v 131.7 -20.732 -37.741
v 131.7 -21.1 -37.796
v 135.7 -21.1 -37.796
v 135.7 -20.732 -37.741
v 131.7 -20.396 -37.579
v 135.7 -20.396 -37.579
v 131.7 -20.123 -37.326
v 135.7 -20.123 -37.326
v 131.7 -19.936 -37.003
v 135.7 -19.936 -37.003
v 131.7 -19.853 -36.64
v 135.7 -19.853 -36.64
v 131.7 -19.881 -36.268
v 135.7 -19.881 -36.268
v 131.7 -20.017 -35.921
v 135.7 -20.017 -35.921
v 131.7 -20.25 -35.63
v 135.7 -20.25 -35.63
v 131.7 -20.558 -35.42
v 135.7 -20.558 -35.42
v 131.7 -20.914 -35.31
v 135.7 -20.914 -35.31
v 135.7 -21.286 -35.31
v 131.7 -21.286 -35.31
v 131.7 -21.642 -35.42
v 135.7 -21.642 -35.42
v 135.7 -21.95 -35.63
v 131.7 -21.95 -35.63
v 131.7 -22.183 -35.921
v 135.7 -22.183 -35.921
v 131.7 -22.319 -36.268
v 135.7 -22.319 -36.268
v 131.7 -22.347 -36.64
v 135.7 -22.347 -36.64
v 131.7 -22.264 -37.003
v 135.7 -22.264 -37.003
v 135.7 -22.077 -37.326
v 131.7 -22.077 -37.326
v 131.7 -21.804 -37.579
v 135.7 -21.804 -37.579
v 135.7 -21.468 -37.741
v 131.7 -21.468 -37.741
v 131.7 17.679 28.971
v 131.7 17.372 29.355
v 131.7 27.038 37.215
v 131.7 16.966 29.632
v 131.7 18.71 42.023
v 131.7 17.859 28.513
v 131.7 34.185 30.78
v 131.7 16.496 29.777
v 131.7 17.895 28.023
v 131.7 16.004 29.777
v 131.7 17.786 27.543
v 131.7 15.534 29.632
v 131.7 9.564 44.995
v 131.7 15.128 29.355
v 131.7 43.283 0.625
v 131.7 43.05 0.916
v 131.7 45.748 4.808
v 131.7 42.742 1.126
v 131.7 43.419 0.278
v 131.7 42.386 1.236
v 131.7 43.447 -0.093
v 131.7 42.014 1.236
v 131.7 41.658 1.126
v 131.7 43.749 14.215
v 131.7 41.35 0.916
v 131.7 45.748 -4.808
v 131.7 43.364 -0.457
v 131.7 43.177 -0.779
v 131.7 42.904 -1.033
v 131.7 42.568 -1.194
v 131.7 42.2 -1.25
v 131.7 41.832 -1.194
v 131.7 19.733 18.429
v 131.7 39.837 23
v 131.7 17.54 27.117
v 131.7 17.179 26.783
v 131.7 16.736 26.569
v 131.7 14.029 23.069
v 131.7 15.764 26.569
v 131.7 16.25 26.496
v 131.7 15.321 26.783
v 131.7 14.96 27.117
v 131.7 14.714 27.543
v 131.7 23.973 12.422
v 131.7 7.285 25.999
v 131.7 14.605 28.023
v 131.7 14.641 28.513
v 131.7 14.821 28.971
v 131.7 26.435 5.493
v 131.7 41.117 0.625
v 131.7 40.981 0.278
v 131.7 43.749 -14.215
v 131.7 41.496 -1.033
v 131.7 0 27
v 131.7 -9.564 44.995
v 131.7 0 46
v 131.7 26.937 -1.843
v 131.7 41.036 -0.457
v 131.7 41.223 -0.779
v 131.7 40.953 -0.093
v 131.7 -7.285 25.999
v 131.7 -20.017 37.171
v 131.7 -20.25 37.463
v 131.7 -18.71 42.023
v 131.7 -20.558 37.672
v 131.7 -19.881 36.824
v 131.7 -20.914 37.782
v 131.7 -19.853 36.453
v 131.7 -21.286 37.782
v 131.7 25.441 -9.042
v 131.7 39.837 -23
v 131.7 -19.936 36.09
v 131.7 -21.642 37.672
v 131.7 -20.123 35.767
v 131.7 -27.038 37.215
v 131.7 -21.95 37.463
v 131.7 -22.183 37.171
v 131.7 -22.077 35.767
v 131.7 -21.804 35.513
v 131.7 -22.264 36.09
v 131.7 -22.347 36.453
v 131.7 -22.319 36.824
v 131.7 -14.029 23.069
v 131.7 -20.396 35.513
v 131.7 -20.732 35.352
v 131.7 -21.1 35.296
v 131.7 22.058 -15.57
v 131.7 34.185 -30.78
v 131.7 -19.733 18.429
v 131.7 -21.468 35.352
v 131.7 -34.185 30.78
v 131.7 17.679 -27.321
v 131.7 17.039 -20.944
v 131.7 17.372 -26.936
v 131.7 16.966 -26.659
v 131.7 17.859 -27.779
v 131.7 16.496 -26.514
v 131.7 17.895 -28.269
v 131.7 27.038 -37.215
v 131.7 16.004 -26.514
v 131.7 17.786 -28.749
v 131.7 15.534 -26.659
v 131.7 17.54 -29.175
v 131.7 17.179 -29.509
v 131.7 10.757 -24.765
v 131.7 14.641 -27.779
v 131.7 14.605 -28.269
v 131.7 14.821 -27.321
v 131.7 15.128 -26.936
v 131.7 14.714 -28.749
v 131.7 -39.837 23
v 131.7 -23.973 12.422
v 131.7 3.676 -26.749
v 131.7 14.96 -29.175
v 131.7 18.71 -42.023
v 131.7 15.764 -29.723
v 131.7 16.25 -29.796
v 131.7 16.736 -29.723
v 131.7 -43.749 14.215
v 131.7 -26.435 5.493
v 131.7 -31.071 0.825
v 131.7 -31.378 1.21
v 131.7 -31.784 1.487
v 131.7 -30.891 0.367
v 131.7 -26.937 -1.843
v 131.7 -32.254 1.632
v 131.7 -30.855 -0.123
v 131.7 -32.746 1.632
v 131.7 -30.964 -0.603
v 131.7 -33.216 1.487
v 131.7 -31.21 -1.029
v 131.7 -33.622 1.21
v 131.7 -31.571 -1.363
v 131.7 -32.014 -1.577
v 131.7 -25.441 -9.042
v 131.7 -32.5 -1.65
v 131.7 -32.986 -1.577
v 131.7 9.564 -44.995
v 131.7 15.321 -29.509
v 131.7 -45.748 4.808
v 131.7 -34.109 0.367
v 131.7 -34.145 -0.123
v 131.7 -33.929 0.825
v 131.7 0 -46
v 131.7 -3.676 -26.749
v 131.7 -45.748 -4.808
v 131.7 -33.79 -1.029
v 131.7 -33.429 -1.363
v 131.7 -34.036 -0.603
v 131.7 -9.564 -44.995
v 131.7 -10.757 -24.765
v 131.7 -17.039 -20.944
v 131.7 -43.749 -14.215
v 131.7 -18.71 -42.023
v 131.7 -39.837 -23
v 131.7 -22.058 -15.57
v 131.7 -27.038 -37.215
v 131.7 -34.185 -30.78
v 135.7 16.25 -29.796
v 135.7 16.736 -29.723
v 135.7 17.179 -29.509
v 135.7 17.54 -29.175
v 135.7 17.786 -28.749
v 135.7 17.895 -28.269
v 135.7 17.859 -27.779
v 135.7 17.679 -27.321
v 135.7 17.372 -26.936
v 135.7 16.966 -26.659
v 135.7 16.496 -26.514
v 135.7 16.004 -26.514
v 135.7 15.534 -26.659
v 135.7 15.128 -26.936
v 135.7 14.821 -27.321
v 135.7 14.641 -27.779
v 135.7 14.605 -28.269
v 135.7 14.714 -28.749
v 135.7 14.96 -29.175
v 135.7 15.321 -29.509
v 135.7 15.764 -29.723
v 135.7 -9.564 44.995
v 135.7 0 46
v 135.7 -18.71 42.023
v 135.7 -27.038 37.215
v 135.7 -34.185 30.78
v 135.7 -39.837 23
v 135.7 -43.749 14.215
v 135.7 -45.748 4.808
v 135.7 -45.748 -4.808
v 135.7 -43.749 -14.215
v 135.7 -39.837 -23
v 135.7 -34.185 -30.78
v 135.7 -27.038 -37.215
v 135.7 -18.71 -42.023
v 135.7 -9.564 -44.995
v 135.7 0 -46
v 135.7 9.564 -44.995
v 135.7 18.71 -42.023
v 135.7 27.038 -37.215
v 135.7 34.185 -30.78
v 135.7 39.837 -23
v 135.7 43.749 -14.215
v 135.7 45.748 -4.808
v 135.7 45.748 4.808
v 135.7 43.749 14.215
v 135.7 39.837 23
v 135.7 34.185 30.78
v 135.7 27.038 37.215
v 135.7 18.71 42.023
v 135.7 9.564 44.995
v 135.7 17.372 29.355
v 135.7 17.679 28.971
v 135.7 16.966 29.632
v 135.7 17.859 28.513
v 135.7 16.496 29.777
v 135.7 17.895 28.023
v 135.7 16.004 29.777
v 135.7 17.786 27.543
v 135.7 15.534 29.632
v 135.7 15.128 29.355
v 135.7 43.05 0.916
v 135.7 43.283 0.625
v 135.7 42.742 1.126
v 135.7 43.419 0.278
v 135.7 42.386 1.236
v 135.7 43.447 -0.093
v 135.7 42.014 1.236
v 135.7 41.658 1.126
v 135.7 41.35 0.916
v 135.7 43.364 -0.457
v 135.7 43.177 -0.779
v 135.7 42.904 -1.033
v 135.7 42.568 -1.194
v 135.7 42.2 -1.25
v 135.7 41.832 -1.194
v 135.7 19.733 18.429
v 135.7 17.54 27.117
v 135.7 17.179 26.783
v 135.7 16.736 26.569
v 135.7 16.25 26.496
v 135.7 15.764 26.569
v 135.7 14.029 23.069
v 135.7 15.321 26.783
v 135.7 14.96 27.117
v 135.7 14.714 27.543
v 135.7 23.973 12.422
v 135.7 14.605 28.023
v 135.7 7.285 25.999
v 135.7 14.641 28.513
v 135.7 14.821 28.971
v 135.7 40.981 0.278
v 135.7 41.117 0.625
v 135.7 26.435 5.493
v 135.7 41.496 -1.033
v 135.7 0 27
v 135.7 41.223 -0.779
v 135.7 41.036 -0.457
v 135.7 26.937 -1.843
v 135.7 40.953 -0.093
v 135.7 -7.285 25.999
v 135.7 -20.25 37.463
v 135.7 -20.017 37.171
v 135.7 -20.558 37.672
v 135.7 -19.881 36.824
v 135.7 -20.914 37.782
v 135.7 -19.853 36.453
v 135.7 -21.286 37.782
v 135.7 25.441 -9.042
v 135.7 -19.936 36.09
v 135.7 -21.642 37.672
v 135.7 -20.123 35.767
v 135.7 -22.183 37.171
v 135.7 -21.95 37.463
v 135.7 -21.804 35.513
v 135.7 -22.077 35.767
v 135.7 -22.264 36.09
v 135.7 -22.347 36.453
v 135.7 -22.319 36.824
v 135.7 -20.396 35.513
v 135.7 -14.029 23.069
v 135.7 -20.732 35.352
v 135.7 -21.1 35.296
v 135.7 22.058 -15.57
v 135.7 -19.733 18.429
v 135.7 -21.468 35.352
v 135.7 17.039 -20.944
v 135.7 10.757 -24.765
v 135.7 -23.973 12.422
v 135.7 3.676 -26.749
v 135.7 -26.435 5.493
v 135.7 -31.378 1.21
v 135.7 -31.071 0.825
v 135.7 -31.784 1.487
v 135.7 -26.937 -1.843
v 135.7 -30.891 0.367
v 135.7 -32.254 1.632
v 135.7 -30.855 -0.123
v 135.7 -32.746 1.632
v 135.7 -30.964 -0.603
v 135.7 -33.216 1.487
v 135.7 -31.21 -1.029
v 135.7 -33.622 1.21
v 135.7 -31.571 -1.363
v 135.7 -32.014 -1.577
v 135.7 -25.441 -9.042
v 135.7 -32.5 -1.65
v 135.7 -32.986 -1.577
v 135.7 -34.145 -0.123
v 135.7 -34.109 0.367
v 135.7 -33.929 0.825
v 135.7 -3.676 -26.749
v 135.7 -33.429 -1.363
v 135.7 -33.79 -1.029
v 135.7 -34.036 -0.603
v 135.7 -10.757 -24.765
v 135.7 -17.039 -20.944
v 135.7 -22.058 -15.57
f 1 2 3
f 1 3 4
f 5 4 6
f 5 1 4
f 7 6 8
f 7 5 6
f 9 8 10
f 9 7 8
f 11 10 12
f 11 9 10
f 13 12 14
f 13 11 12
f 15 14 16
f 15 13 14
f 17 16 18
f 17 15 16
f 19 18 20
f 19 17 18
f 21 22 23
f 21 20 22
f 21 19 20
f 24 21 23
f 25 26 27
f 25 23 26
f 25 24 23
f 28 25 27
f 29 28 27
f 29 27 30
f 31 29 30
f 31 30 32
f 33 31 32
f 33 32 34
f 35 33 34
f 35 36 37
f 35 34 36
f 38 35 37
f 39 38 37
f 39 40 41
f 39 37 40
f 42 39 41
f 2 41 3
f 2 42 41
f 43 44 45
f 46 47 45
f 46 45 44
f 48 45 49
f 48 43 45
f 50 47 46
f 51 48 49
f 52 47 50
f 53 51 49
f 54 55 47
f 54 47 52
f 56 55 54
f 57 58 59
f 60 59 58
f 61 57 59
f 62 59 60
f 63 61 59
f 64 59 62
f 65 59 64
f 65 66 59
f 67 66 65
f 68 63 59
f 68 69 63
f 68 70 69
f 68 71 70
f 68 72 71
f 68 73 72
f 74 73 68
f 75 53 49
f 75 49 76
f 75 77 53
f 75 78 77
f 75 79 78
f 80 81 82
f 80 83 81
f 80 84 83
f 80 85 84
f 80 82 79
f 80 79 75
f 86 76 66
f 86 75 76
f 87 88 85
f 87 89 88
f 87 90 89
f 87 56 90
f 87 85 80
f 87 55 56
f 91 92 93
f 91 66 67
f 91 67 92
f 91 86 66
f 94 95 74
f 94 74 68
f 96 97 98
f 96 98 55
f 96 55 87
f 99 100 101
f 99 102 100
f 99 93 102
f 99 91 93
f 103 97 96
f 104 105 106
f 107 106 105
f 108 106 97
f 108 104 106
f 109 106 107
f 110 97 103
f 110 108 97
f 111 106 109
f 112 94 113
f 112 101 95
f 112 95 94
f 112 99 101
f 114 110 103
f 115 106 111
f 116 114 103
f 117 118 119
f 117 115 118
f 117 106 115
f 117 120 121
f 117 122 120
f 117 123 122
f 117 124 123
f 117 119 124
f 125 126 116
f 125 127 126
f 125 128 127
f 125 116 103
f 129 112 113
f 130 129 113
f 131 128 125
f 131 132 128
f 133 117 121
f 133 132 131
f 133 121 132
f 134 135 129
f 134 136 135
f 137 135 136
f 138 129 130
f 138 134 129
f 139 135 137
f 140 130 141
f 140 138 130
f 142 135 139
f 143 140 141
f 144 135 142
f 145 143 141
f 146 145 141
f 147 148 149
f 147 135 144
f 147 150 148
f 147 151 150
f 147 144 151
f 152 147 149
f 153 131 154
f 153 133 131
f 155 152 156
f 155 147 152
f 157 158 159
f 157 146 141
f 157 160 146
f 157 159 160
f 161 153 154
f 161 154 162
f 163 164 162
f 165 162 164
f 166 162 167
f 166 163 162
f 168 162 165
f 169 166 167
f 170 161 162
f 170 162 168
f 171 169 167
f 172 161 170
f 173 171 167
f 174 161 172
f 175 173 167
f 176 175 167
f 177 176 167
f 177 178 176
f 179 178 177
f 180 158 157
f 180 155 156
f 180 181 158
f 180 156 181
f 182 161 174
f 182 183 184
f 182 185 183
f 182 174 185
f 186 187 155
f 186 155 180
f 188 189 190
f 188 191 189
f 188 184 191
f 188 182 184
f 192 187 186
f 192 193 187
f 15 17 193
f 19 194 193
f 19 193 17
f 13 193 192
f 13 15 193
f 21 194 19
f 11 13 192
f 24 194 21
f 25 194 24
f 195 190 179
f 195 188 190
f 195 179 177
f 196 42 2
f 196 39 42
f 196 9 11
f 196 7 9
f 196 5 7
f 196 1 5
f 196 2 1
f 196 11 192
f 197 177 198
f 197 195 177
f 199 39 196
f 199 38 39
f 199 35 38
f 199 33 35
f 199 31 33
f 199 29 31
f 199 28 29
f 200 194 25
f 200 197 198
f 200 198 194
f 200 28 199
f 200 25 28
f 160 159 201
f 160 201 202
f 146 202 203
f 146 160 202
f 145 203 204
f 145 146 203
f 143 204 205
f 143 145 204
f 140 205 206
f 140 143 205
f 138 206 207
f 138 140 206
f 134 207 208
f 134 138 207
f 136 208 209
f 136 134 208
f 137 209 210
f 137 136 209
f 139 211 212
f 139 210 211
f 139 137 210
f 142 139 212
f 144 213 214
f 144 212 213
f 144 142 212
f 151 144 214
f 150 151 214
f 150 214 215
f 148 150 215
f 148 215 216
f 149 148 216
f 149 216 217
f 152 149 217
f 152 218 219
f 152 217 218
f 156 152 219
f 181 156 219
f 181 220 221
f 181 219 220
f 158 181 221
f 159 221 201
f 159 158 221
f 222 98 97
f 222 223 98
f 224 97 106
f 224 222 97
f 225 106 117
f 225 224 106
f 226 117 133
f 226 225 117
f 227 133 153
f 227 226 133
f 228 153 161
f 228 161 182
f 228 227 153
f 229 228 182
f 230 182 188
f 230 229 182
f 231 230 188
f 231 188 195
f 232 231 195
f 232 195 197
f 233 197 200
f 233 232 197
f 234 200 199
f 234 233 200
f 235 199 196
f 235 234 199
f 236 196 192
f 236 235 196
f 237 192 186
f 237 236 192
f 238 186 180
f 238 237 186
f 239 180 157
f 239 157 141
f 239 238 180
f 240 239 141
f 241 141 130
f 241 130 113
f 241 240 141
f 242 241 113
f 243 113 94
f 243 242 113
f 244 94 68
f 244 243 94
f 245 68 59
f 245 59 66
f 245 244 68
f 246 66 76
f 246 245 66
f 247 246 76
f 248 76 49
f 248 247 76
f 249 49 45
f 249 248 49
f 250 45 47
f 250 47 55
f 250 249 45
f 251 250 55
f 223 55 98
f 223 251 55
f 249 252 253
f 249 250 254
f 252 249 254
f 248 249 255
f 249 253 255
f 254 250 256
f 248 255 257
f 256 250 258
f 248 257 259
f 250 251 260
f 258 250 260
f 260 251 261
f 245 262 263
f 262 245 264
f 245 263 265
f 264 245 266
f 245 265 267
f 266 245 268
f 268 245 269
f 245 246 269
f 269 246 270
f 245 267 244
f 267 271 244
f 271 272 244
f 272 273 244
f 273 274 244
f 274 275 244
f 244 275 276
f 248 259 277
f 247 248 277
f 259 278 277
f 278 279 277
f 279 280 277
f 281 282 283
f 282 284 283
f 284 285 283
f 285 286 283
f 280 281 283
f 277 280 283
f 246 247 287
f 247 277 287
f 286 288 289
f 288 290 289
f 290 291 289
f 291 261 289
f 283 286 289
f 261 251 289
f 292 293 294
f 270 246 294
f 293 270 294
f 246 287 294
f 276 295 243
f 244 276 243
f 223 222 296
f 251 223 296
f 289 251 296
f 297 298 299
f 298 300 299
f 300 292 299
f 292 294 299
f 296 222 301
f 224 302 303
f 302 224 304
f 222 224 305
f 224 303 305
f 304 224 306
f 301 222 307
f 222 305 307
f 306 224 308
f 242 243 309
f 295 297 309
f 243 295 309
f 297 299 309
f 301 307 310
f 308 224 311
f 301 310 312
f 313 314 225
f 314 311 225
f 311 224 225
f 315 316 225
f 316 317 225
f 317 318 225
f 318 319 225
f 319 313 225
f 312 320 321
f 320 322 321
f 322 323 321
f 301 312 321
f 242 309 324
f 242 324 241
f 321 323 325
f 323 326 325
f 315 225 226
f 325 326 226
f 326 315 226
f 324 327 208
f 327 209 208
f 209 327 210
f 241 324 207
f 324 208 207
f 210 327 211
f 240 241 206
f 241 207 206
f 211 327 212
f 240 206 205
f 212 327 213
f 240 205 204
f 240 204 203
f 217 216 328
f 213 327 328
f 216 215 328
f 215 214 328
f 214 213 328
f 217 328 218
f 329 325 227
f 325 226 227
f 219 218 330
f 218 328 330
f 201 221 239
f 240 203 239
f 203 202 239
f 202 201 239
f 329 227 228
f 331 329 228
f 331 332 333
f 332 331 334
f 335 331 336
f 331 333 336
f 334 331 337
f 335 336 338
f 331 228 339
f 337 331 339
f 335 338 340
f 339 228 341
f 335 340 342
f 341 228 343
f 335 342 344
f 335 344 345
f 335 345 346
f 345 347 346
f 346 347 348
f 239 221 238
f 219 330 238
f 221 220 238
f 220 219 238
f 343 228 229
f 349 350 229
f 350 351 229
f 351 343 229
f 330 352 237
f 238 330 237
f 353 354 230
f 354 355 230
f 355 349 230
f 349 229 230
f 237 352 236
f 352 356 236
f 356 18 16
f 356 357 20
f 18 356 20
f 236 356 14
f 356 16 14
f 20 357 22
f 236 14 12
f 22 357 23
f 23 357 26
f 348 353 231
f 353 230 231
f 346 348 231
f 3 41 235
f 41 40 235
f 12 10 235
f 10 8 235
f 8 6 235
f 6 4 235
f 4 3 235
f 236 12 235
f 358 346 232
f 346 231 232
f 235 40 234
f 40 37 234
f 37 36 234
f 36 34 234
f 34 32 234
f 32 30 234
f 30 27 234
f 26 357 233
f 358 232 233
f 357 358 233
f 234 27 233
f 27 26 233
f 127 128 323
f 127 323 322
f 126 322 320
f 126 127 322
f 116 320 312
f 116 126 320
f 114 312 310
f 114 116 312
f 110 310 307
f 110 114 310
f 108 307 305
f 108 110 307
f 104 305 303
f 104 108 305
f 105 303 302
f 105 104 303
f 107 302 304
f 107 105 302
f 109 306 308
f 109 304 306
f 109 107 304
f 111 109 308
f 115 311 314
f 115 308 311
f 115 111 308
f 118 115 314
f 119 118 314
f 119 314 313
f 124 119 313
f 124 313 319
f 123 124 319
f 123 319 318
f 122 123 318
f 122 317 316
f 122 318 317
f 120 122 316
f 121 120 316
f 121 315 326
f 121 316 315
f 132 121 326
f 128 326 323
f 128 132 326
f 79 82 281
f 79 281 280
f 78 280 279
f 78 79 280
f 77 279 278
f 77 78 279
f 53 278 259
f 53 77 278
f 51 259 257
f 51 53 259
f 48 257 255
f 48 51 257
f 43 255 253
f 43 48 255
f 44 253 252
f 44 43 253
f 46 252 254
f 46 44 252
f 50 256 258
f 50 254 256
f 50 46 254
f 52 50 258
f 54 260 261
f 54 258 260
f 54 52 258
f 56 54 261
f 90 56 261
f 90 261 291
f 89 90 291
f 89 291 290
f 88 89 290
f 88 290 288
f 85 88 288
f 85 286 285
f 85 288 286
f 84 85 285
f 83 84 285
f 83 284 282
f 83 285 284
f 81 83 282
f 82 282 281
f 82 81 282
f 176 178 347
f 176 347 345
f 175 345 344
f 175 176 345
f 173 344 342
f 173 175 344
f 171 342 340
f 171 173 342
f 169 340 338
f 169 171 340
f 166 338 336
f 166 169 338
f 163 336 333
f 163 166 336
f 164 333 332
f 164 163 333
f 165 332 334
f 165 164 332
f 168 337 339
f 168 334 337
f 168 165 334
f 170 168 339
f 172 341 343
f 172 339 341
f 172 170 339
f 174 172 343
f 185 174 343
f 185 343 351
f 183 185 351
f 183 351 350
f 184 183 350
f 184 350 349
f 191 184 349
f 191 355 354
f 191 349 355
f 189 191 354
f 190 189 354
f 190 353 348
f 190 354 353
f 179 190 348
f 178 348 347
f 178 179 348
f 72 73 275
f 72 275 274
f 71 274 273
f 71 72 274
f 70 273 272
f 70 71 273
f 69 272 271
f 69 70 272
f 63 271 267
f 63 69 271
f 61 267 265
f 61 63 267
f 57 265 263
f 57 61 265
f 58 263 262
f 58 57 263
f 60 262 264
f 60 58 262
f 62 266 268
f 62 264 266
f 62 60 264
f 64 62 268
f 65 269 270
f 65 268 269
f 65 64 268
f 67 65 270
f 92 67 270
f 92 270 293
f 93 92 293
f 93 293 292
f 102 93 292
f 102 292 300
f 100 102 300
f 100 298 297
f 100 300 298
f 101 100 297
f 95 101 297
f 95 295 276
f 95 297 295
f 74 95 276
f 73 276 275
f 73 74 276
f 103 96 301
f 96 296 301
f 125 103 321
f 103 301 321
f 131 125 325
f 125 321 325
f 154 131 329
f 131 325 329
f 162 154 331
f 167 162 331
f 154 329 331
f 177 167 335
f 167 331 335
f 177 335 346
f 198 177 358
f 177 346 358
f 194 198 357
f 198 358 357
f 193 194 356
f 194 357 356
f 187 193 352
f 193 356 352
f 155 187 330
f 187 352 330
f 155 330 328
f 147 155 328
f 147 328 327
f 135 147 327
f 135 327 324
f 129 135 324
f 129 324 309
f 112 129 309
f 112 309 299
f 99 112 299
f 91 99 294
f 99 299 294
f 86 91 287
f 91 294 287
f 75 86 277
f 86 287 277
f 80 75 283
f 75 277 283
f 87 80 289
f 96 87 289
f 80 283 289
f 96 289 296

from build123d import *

# Parameters (mm, degrees)
AXIAL_PROFILE_MM_W     = 4
AXIAL_PROFILE_MM_H     = 19
AXIAL_HOLES_DEPTH      = 151.487507787
AXIAL_HOLES_DEPTH_BACK = 151.487507787
SKETCH2_R              = 1.25
SKETCH2_R_2            = 1.65


with BuildPart() as part:
    # Axial profile (mm) → Full revolution (revolve)
    with BuildSketch(Plane.XY, mode=Mode.PRIVATE) as full_revolution_sk:
        with Locations((133.7, 36.5)):
            Rectangle(AXIAL_PROFILE_MM_W, AXIAL_PROFILE_MM_H)
    revolve(full_revolution_sk.sketch.rotate(Axis((-110, 0, 0), (1, 0, 0)), 90), axis=Axis((-110, 0, 0), (1, 0, 0)))

    # Sketch2 → Axial holes (cut, two sides: drawn at the far end of the back side and taken through both)
    with BuildSketch(Plane(origin=(0, 0, 0), x_dir=(0, 0, -1), z_dir=(1, 0, 0)).offset(-AXIAL_HOLES_DEPTH_BACK)):
        with Locations((0, 42.2)):
            Circle(SKETCH2_R)
        with Locations((-36.54627204, -21.1)):
            Circle(SKETCH2_R)
        with Locations((36.54627204, -21.1)):
            Circle(SKETCH2_R)
        with Locations((-28.145825623, 16.25)):
            Circle(SKETCH2_R_2)
        with Locations((0, -32.5)):
            Circle(SKETCH2_R_2)
        with Locations((28.145825623, 16.25)):
            Circle(SKETCH2_R_2)
    extrude(amount=AXIAL_HOLES_DEPTH + AXIAL_HOLES_DEPTH_BACK, mode=Mode.SUBTRACT)


solid = part.part
